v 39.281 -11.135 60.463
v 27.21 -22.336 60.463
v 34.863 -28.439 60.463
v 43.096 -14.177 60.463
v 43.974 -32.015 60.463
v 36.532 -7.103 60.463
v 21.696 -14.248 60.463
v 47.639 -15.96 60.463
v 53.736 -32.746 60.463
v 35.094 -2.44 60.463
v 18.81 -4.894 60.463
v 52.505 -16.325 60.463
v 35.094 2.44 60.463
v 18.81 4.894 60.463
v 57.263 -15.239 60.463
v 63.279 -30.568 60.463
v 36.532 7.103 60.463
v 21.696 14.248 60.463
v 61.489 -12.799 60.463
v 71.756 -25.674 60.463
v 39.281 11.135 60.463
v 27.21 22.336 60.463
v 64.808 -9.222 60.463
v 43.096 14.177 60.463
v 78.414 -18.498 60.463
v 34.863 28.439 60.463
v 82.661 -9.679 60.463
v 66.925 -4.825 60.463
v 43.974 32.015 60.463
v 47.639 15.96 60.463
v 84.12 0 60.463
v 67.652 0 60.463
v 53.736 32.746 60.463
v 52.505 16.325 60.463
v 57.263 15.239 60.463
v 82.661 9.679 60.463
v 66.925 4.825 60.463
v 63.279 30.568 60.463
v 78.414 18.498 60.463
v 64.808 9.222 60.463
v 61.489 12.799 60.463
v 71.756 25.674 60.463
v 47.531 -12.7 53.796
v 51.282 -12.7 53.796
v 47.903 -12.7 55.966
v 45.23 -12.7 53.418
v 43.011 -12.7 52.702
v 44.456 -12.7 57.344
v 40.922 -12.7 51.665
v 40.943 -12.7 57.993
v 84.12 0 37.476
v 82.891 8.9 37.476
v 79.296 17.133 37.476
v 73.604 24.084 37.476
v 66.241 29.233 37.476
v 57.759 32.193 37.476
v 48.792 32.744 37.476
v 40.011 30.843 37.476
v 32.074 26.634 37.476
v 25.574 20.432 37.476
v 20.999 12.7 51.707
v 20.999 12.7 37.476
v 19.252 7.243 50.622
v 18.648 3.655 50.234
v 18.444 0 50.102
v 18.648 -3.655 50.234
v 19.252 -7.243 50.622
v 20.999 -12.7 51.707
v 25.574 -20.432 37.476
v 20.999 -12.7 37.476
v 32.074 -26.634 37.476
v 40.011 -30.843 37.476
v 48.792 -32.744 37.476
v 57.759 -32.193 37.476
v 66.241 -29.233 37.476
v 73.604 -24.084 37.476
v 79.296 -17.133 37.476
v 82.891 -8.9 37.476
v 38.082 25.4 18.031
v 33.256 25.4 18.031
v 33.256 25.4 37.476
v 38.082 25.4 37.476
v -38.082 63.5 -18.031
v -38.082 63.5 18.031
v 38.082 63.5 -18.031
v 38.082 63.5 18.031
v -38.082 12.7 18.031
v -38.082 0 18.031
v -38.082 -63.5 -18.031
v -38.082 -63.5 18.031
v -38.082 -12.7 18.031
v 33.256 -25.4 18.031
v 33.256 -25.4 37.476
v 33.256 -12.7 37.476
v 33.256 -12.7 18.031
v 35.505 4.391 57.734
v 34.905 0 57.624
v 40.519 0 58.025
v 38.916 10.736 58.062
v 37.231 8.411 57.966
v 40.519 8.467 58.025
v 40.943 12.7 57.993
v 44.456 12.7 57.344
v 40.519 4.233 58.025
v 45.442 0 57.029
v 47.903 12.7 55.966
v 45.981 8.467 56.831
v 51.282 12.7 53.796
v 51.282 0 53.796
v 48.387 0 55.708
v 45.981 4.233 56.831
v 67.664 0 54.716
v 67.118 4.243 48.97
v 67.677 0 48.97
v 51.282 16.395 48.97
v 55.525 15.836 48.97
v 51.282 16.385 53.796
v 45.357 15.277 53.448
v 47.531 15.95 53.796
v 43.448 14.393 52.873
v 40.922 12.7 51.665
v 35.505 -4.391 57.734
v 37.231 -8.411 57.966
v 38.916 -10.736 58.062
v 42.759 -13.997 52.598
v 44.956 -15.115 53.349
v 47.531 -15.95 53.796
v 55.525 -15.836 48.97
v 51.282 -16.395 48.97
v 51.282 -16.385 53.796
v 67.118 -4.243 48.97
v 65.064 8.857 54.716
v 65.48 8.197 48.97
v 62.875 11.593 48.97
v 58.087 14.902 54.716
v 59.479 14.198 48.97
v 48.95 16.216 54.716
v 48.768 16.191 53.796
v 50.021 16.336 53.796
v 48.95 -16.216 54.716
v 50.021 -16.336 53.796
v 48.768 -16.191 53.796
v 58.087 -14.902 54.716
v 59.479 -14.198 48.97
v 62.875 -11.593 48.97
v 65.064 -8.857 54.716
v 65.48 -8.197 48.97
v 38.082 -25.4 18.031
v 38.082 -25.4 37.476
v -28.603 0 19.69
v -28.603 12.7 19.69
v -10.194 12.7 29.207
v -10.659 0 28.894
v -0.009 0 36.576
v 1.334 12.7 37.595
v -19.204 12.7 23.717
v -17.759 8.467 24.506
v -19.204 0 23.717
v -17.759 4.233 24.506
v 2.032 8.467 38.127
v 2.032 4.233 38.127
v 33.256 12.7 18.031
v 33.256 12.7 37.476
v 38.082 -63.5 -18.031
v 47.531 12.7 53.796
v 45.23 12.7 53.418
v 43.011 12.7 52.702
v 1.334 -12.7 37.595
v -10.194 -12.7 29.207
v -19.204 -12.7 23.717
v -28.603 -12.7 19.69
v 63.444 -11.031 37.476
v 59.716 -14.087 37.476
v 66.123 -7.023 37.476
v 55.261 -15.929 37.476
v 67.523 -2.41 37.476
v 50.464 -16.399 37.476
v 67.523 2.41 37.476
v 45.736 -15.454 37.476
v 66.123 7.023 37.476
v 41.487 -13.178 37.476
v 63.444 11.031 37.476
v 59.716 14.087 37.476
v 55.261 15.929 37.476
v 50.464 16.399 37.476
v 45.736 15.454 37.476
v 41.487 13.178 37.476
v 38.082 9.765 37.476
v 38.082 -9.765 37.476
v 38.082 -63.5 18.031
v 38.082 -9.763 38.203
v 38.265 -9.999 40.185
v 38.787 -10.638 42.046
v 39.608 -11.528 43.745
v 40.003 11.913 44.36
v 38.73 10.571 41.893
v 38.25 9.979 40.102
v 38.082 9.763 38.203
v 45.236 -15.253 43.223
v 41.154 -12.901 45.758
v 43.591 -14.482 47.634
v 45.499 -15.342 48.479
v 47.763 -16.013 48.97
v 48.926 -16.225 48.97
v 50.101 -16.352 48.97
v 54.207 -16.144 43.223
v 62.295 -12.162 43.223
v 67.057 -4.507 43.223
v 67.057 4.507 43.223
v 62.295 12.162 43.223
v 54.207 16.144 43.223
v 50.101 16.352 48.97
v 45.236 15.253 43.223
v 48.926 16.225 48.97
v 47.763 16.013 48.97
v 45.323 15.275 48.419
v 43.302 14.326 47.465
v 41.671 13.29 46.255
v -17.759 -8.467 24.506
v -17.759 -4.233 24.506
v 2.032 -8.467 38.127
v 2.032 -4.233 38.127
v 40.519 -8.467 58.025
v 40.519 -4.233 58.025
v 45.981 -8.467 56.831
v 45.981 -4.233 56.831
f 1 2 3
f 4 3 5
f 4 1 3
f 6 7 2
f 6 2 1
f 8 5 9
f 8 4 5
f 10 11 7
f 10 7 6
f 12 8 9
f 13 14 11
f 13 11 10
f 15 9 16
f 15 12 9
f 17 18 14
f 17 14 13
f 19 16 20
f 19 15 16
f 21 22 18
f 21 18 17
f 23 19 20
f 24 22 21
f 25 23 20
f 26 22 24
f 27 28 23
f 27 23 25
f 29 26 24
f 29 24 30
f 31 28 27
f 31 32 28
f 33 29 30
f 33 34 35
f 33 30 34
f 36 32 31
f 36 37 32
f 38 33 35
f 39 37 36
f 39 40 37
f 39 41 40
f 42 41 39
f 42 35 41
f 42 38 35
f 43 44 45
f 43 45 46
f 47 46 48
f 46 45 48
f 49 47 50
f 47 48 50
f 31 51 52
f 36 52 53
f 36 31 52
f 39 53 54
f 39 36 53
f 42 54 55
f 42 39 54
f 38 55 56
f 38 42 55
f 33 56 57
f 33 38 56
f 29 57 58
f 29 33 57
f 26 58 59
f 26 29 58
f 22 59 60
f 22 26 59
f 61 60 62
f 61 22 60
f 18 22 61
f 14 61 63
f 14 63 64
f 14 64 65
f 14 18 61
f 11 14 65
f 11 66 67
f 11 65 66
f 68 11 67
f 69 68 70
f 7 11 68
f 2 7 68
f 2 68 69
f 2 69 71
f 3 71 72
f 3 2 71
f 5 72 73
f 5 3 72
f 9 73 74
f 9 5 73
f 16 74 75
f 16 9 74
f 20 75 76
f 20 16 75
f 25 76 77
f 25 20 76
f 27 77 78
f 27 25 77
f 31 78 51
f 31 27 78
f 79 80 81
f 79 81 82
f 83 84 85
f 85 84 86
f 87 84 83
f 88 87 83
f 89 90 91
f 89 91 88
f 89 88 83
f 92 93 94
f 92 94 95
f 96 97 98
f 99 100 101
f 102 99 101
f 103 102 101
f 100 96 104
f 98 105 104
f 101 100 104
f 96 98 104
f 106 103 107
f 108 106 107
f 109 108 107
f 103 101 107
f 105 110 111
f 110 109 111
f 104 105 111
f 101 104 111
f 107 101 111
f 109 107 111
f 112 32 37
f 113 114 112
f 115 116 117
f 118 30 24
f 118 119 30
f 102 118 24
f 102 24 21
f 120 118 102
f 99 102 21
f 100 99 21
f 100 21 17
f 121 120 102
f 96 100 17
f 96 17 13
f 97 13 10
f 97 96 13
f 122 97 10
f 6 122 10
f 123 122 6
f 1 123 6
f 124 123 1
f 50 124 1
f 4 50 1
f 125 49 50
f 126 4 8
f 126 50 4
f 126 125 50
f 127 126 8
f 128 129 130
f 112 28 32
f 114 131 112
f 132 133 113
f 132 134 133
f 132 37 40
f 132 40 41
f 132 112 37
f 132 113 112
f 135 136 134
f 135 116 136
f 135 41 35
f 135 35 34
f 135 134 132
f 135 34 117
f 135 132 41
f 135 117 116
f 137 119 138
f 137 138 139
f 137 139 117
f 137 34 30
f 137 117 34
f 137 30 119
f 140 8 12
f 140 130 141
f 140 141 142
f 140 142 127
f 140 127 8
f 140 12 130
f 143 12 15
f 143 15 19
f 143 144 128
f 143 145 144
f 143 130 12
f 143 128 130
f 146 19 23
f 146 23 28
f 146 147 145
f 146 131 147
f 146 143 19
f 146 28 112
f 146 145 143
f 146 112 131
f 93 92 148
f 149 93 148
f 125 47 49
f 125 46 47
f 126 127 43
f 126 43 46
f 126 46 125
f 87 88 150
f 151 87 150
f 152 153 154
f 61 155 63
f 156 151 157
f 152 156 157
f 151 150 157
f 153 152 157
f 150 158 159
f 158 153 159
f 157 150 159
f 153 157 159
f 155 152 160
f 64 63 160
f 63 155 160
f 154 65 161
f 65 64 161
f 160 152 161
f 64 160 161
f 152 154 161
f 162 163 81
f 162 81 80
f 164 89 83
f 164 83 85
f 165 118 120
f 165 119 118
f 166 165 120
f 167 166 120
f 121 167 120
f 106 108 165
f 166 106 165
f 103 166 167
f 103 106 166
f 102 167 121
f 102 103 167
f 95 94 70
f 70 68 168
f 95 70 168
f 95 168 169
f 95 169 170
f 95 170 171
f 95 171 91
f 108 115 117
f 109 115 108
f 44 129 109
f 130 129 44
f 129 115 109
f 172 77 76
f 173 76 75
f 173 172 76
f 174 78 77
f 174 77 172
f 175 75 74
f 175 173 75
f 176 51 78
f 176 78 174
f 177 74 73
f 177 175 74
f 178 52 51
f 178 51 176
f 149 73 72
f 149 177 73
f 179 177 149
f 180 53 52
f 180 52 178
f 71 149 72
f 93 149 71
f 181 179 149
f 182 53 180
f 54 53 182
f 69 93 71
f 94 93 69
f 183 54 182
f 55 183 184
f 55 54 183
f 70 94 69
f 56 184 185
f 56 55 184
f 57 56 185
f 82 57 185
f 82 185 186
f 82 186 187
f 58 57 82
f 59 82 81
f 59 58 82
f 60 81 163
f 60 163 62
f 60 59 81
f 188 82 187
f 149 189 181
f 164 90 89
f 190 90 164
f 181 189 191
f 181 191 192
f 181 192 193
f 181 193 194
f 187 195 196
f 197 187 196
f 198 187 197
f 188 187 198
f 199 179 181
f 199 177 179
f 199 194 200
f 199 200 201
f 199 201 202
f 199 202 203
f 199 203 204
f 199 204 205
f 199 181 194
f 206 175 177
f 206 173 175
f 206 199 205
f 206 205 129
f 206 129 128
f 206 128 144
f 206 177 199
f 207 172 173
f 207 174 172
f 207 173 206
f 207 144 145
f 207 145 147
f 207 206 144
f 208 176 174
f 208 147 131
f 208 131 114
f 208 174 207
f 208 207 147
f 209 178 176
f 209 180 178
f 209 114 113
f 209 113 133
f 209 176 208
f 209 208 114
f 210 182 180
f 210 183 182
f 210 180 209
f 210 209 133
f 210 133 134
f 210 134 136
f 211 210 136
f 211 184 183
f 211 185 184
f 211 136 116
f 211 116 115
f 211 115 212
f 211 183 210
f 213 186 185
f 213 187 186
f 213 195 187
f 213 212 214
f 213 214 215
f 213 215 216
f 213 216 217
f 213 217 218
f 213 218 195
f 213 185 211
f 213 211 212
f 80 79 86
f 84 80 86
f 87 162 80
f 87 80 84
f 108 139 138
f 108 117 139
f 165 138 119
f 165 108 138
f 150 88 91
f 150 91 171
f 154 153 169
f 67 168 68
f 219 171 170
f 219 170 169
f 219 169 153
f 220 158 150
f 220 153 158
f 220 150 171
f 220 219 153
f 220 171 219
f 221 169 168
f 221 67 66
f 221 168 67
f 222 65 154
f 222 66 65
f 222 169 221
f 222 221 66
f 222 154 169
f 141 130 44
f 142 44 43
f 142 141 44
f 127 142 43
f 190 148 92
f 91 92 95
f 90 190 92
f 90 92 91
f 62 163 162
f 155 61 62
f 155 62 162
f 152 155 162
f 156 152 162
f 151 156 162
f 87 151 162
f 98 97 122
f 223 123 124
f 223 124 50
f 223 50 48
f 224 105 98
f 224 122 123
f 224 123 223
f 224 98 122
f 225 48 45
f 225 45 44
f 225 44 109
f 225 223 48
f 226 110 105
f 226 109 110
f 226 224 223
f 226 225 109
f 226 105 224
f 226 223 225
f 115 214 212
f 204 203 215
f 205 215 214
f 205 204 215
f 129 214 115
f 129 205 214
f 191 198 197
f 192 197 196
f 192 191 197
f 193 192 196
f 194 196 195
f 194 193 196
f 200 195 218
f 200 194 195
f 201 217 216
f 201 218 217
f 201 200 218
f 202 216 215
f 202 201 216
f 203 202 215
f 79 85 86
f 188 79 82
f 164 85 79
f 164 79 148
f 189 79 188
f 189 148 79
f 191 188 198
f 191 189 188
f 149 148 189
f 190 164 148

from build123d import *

# Parameters (mm, degrees)
F1_DEPTH = 63.5
F2_DEPTH = 25.4
F3_DEPTH = 12.7


with BuildPart() as f1:
    # F0 (on Front) → F1 (new body, symmetric)
    with BuildSketch(Plane.XZ):
        Polygon((33.25627, 18.030804), (-38.082272, 18.030804), (-38.082272, -18.030804), (38.082272, -18.030804), (38.082272, 18.030804), align=None)
    extrude(amount=F1_DEPTH, both=True)

    # F0 (on Front) → F2 (join, symmetric)
    with BuildSketch(Plane.XZ):
        with BuildLine():
            Line((33.25627, 38.202789), (33.25627, 18.030804))
            Line((33.25627, 18.030804), (38.082272, 18.030804))
            Line((38.082272, 18.030804), (38.082272, 38.202789))
            ThreePointArc((38.082272, 38.202789), (40.858393, 45.442439), (47.763245, 48.969819))
            Line((47.763245, 48.969819), (51.281622, 48.969819))
            Line((51.281622, 48.969819), (51.281622, 53.79582))
            Line((51.281622, 53.79582), (47.53053, 53.79582))
            ThreePointArc((47.53053, 53.79582), (37.363711, 48.772759), (33.25627, 38.202789))
        make_face()
    extrude(amount=F2_DEPTH, both=True)

    # F0 (on Front) → F3 (join, symmetric)
    with BuildSketch(Plane.XZ):
        with BuildLine():
            add(Edge.make_bspline(
                [(-38.082272, 18.030804), (-5.656304, 18.834018), (25.872232, 73.464645), (51.281622, 53.79582)],
                knots=[0, 0, 0, 0, 96.255087, 96.255087, 96.255087, 96.255087], degree=3))
            Line((-38.082272, 18.030804), (33.25627, 18.030804))
            Line((33.25627, 18.030804), (33.25627, 38.202789))
            ThreePointArc((33.25627, 38.202789), (37.363711, 48.772759), (47.53053, 53.79582))
            Line((47.53053, 53.79582), (51.281622, 53.79582))
        make_face()
    extrude(amount=F3_DEPTH, both=True)

    # F0 (on Front) → F4 (revolve)
    with BuildSketch(Plane.XZ):
        Polygon((84.119728, 60.463159), (67.652359, 60.463159), (67.676517, 48.969819), (67.700675, 37.476478), (84.119728, 37.476478), align=None)
    revolve(axis=Axis((51.281622, 0, 48.969819), (0, 0, 1)))


solid = f1.part
